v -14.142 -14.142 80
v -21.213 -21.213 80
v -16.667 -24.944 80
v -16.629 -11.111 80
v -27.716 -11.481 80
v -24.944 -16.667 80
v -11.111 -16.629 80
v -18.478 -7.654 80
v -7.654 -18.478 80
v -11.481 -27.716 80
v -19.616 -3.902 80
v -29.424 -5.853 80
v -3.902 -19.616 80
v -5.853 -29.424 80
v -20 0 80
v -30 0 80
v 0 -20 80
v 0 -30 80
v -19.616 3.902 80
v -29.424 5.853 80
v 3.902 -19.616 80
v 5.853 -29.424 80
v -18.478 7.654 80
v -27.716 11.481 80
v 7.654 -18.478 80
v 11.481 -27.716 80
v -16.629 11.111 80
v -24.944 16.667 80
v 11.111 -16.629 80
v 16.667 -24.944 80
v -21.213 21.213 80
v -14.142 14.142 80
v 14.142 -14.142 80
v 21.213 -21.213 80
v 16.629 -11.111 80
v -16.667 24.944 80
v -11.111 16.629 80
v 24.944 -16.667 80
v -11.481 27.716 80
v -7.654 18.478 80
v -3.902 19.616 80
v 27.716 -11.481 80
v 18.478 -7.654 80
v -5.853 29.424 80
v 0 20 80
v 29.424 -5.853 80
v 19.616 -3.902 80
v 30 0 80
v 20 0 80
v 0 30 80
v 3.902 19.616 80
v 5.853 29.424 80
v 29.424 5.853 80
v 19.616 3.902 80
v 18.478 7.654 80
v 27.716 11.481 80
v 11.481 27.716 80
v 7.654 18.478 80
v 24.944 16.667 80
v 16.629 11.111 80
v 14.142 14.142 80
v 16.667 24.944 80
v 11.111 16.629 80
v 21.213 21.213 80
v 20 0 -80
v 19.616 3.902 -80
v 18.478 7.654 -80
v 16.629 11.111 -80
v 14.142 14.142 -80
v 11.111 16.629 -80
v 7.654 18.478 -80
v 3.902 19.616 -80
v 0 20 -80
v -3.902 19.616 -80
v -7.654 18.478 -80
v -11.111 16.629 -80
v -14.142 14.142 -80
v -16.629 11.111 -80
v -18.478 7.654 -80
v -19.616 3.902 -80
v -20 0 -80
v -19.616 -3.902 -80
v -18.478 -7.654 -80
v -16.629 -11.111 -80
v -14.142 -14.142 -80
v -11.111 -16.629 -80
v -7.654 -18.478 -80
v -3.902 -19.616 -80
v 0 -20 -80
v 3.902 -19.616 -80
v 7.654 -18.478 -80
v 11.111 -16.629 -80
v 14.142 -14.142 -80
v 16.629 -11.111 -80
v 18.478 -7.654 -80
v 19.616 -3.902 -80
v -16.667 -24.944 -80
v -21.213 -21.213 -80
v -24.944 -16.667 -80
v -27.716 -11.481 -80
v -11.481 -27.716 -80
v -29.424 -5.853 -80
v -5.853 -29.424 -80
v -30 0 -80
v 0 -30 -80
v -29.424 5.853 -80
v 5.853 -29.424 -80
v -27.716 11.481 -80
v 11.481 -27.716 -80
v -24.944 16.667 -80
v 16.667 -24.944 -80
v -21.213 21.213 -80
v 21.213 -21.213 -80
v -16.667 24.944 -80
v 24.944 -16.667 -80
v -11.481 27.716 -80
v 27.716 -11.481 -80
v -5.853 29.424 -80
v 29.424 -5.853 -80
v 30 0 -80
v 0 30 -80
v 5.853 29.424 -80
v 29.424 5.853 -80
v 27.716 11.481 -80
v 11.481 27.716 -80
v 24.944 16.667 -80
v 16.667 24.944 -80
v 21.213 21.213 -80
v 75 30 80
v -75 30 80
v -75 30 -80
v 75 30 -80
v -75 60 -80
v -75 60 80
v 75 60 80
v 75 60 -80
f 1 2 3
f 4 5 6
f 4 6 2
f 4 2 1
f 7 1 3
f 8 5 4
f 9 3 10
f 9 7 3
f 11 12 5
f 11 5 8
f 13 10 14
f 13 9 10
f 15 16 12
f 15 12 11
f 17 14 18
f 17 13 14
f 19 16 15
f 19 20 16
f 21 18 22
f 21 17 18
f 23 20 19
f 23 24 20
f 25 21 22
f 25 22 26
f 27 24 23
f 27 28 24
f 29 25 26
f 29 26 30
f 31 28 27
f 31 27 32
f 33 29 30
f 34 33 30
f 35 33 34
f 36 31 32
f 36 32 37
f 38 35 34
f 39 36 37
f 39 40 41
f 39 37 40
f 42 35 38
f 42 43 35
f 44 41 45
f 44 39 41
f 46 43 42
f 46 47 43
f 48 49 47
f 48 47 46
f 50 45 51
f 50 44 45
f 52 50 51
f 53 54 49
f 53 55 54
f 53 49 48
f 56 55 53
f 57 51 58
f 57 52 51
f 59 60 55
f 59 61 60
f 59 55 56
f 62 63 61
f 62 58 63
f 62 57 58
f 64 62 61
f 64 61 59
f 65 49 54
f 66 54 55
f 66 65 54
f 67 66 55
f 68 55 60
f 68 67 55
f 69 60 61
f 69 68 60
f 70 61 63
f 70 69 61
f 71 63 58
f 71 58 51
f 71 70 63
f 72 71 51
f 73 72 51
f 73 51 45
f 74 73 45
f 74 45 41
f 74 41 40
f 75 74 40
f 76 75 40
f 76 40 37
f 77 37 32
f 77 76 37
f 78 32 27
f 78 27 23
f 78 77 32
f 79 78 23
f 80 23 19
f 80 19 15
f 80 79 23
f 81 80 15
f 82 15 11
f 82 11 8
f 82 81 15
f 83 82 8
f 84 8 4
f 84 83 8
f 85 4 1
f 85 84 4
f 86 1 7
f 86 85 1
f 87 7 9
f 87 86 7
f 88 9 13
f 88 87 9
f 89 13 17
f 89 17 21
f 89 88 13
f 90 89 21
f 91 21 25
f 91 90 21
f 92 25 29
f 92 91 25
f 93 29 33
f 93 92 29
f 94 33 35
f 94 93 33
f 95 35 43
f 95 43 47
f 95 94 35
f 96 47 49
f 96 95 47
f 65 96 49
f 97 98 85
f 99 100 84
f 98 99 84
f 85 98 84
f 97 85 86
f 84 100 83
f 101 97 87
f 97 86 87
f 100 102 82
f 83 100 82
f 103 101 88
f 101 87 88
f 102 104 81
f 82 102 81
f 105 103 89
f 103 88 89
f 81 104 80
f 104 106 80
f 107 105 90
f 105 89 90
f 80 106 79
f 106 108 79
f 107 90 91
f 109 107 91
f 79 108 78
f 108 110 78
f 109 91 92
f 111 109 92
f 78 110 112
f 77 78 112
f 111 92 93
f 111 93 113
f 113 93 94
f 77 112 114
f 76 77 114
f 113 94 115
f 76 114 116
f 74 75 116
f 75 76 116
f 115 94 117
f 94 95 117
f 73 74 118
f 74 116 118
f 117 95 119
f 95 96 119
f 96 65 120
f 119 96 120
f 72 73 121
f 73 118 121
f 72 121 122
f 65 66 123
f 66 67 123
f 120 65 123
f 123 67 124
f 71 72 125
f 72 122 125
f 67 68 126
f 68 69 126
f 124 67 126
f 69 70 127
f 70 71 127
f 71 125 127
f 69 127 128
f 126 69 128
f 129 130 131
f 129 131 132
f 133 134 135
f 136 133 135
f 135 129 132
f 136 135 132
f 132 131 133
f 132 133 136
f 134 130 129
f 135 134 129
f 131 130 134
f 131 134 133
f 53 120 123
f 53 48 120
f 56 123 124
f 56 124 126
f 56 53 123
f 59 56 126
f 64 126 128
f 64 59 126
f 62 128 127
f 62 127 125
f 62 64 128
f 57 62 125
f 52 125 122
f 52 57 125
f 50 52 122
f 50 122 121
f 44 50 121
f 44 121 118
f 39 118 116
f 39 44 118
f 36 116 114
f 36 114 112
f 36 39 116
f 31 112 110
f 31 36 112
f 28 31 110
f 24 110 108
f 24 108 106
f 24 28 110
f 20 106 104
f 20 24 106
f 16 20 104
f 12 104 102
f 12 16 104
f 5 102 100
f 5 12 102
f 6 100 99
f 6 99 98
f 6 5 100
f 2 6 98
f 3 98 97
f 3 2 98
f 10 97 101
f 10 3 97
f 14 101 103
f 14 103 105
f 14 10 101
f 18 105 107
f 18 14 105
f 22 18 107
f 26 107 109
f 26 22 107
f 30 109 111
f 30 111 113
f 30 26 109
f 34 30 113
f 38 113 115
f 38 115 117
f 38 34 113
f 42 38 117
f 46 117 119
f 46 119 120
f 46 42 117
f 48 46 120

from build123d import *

# Parameters (mm, degrees)
SKETCH1_R           = 30
SKETCH1_R_2         = 20
BOSS_EXTRUDE1_DEPTH = 80
SKETCH2_W           = 150
SKETCH2_H           = 160
BOSS_EXTRUDE2_DEPTH = 30


with BuildPart() as part:
    # Sketch1 → Boss-Extrude1 (new, symmetric)
    with BuildSketch(Plane.XY):
        Circle(SKETCH1_R)
        Circle(SKETCH1_R_2, mode=Mode.SUBTRACT)
    extrude(amount=BOSS_EXTRUDE1_DEPTH, both=True)


with BuildPart() as body_2:
    # Sketch2 → Boss-Extrude2 (new body)
    with BuildSketch(Plane(origin=(0, 30, 0), x_dir=(1, 0, 0), z_dir=(0, 1, 0))):
        Rectangle(SKETCH2_W, SKETCH2_H)
    extrude(amount=BOSS_EXTRUDE2_DEPTH)


solid = Compound([part.part, body_2.part])
